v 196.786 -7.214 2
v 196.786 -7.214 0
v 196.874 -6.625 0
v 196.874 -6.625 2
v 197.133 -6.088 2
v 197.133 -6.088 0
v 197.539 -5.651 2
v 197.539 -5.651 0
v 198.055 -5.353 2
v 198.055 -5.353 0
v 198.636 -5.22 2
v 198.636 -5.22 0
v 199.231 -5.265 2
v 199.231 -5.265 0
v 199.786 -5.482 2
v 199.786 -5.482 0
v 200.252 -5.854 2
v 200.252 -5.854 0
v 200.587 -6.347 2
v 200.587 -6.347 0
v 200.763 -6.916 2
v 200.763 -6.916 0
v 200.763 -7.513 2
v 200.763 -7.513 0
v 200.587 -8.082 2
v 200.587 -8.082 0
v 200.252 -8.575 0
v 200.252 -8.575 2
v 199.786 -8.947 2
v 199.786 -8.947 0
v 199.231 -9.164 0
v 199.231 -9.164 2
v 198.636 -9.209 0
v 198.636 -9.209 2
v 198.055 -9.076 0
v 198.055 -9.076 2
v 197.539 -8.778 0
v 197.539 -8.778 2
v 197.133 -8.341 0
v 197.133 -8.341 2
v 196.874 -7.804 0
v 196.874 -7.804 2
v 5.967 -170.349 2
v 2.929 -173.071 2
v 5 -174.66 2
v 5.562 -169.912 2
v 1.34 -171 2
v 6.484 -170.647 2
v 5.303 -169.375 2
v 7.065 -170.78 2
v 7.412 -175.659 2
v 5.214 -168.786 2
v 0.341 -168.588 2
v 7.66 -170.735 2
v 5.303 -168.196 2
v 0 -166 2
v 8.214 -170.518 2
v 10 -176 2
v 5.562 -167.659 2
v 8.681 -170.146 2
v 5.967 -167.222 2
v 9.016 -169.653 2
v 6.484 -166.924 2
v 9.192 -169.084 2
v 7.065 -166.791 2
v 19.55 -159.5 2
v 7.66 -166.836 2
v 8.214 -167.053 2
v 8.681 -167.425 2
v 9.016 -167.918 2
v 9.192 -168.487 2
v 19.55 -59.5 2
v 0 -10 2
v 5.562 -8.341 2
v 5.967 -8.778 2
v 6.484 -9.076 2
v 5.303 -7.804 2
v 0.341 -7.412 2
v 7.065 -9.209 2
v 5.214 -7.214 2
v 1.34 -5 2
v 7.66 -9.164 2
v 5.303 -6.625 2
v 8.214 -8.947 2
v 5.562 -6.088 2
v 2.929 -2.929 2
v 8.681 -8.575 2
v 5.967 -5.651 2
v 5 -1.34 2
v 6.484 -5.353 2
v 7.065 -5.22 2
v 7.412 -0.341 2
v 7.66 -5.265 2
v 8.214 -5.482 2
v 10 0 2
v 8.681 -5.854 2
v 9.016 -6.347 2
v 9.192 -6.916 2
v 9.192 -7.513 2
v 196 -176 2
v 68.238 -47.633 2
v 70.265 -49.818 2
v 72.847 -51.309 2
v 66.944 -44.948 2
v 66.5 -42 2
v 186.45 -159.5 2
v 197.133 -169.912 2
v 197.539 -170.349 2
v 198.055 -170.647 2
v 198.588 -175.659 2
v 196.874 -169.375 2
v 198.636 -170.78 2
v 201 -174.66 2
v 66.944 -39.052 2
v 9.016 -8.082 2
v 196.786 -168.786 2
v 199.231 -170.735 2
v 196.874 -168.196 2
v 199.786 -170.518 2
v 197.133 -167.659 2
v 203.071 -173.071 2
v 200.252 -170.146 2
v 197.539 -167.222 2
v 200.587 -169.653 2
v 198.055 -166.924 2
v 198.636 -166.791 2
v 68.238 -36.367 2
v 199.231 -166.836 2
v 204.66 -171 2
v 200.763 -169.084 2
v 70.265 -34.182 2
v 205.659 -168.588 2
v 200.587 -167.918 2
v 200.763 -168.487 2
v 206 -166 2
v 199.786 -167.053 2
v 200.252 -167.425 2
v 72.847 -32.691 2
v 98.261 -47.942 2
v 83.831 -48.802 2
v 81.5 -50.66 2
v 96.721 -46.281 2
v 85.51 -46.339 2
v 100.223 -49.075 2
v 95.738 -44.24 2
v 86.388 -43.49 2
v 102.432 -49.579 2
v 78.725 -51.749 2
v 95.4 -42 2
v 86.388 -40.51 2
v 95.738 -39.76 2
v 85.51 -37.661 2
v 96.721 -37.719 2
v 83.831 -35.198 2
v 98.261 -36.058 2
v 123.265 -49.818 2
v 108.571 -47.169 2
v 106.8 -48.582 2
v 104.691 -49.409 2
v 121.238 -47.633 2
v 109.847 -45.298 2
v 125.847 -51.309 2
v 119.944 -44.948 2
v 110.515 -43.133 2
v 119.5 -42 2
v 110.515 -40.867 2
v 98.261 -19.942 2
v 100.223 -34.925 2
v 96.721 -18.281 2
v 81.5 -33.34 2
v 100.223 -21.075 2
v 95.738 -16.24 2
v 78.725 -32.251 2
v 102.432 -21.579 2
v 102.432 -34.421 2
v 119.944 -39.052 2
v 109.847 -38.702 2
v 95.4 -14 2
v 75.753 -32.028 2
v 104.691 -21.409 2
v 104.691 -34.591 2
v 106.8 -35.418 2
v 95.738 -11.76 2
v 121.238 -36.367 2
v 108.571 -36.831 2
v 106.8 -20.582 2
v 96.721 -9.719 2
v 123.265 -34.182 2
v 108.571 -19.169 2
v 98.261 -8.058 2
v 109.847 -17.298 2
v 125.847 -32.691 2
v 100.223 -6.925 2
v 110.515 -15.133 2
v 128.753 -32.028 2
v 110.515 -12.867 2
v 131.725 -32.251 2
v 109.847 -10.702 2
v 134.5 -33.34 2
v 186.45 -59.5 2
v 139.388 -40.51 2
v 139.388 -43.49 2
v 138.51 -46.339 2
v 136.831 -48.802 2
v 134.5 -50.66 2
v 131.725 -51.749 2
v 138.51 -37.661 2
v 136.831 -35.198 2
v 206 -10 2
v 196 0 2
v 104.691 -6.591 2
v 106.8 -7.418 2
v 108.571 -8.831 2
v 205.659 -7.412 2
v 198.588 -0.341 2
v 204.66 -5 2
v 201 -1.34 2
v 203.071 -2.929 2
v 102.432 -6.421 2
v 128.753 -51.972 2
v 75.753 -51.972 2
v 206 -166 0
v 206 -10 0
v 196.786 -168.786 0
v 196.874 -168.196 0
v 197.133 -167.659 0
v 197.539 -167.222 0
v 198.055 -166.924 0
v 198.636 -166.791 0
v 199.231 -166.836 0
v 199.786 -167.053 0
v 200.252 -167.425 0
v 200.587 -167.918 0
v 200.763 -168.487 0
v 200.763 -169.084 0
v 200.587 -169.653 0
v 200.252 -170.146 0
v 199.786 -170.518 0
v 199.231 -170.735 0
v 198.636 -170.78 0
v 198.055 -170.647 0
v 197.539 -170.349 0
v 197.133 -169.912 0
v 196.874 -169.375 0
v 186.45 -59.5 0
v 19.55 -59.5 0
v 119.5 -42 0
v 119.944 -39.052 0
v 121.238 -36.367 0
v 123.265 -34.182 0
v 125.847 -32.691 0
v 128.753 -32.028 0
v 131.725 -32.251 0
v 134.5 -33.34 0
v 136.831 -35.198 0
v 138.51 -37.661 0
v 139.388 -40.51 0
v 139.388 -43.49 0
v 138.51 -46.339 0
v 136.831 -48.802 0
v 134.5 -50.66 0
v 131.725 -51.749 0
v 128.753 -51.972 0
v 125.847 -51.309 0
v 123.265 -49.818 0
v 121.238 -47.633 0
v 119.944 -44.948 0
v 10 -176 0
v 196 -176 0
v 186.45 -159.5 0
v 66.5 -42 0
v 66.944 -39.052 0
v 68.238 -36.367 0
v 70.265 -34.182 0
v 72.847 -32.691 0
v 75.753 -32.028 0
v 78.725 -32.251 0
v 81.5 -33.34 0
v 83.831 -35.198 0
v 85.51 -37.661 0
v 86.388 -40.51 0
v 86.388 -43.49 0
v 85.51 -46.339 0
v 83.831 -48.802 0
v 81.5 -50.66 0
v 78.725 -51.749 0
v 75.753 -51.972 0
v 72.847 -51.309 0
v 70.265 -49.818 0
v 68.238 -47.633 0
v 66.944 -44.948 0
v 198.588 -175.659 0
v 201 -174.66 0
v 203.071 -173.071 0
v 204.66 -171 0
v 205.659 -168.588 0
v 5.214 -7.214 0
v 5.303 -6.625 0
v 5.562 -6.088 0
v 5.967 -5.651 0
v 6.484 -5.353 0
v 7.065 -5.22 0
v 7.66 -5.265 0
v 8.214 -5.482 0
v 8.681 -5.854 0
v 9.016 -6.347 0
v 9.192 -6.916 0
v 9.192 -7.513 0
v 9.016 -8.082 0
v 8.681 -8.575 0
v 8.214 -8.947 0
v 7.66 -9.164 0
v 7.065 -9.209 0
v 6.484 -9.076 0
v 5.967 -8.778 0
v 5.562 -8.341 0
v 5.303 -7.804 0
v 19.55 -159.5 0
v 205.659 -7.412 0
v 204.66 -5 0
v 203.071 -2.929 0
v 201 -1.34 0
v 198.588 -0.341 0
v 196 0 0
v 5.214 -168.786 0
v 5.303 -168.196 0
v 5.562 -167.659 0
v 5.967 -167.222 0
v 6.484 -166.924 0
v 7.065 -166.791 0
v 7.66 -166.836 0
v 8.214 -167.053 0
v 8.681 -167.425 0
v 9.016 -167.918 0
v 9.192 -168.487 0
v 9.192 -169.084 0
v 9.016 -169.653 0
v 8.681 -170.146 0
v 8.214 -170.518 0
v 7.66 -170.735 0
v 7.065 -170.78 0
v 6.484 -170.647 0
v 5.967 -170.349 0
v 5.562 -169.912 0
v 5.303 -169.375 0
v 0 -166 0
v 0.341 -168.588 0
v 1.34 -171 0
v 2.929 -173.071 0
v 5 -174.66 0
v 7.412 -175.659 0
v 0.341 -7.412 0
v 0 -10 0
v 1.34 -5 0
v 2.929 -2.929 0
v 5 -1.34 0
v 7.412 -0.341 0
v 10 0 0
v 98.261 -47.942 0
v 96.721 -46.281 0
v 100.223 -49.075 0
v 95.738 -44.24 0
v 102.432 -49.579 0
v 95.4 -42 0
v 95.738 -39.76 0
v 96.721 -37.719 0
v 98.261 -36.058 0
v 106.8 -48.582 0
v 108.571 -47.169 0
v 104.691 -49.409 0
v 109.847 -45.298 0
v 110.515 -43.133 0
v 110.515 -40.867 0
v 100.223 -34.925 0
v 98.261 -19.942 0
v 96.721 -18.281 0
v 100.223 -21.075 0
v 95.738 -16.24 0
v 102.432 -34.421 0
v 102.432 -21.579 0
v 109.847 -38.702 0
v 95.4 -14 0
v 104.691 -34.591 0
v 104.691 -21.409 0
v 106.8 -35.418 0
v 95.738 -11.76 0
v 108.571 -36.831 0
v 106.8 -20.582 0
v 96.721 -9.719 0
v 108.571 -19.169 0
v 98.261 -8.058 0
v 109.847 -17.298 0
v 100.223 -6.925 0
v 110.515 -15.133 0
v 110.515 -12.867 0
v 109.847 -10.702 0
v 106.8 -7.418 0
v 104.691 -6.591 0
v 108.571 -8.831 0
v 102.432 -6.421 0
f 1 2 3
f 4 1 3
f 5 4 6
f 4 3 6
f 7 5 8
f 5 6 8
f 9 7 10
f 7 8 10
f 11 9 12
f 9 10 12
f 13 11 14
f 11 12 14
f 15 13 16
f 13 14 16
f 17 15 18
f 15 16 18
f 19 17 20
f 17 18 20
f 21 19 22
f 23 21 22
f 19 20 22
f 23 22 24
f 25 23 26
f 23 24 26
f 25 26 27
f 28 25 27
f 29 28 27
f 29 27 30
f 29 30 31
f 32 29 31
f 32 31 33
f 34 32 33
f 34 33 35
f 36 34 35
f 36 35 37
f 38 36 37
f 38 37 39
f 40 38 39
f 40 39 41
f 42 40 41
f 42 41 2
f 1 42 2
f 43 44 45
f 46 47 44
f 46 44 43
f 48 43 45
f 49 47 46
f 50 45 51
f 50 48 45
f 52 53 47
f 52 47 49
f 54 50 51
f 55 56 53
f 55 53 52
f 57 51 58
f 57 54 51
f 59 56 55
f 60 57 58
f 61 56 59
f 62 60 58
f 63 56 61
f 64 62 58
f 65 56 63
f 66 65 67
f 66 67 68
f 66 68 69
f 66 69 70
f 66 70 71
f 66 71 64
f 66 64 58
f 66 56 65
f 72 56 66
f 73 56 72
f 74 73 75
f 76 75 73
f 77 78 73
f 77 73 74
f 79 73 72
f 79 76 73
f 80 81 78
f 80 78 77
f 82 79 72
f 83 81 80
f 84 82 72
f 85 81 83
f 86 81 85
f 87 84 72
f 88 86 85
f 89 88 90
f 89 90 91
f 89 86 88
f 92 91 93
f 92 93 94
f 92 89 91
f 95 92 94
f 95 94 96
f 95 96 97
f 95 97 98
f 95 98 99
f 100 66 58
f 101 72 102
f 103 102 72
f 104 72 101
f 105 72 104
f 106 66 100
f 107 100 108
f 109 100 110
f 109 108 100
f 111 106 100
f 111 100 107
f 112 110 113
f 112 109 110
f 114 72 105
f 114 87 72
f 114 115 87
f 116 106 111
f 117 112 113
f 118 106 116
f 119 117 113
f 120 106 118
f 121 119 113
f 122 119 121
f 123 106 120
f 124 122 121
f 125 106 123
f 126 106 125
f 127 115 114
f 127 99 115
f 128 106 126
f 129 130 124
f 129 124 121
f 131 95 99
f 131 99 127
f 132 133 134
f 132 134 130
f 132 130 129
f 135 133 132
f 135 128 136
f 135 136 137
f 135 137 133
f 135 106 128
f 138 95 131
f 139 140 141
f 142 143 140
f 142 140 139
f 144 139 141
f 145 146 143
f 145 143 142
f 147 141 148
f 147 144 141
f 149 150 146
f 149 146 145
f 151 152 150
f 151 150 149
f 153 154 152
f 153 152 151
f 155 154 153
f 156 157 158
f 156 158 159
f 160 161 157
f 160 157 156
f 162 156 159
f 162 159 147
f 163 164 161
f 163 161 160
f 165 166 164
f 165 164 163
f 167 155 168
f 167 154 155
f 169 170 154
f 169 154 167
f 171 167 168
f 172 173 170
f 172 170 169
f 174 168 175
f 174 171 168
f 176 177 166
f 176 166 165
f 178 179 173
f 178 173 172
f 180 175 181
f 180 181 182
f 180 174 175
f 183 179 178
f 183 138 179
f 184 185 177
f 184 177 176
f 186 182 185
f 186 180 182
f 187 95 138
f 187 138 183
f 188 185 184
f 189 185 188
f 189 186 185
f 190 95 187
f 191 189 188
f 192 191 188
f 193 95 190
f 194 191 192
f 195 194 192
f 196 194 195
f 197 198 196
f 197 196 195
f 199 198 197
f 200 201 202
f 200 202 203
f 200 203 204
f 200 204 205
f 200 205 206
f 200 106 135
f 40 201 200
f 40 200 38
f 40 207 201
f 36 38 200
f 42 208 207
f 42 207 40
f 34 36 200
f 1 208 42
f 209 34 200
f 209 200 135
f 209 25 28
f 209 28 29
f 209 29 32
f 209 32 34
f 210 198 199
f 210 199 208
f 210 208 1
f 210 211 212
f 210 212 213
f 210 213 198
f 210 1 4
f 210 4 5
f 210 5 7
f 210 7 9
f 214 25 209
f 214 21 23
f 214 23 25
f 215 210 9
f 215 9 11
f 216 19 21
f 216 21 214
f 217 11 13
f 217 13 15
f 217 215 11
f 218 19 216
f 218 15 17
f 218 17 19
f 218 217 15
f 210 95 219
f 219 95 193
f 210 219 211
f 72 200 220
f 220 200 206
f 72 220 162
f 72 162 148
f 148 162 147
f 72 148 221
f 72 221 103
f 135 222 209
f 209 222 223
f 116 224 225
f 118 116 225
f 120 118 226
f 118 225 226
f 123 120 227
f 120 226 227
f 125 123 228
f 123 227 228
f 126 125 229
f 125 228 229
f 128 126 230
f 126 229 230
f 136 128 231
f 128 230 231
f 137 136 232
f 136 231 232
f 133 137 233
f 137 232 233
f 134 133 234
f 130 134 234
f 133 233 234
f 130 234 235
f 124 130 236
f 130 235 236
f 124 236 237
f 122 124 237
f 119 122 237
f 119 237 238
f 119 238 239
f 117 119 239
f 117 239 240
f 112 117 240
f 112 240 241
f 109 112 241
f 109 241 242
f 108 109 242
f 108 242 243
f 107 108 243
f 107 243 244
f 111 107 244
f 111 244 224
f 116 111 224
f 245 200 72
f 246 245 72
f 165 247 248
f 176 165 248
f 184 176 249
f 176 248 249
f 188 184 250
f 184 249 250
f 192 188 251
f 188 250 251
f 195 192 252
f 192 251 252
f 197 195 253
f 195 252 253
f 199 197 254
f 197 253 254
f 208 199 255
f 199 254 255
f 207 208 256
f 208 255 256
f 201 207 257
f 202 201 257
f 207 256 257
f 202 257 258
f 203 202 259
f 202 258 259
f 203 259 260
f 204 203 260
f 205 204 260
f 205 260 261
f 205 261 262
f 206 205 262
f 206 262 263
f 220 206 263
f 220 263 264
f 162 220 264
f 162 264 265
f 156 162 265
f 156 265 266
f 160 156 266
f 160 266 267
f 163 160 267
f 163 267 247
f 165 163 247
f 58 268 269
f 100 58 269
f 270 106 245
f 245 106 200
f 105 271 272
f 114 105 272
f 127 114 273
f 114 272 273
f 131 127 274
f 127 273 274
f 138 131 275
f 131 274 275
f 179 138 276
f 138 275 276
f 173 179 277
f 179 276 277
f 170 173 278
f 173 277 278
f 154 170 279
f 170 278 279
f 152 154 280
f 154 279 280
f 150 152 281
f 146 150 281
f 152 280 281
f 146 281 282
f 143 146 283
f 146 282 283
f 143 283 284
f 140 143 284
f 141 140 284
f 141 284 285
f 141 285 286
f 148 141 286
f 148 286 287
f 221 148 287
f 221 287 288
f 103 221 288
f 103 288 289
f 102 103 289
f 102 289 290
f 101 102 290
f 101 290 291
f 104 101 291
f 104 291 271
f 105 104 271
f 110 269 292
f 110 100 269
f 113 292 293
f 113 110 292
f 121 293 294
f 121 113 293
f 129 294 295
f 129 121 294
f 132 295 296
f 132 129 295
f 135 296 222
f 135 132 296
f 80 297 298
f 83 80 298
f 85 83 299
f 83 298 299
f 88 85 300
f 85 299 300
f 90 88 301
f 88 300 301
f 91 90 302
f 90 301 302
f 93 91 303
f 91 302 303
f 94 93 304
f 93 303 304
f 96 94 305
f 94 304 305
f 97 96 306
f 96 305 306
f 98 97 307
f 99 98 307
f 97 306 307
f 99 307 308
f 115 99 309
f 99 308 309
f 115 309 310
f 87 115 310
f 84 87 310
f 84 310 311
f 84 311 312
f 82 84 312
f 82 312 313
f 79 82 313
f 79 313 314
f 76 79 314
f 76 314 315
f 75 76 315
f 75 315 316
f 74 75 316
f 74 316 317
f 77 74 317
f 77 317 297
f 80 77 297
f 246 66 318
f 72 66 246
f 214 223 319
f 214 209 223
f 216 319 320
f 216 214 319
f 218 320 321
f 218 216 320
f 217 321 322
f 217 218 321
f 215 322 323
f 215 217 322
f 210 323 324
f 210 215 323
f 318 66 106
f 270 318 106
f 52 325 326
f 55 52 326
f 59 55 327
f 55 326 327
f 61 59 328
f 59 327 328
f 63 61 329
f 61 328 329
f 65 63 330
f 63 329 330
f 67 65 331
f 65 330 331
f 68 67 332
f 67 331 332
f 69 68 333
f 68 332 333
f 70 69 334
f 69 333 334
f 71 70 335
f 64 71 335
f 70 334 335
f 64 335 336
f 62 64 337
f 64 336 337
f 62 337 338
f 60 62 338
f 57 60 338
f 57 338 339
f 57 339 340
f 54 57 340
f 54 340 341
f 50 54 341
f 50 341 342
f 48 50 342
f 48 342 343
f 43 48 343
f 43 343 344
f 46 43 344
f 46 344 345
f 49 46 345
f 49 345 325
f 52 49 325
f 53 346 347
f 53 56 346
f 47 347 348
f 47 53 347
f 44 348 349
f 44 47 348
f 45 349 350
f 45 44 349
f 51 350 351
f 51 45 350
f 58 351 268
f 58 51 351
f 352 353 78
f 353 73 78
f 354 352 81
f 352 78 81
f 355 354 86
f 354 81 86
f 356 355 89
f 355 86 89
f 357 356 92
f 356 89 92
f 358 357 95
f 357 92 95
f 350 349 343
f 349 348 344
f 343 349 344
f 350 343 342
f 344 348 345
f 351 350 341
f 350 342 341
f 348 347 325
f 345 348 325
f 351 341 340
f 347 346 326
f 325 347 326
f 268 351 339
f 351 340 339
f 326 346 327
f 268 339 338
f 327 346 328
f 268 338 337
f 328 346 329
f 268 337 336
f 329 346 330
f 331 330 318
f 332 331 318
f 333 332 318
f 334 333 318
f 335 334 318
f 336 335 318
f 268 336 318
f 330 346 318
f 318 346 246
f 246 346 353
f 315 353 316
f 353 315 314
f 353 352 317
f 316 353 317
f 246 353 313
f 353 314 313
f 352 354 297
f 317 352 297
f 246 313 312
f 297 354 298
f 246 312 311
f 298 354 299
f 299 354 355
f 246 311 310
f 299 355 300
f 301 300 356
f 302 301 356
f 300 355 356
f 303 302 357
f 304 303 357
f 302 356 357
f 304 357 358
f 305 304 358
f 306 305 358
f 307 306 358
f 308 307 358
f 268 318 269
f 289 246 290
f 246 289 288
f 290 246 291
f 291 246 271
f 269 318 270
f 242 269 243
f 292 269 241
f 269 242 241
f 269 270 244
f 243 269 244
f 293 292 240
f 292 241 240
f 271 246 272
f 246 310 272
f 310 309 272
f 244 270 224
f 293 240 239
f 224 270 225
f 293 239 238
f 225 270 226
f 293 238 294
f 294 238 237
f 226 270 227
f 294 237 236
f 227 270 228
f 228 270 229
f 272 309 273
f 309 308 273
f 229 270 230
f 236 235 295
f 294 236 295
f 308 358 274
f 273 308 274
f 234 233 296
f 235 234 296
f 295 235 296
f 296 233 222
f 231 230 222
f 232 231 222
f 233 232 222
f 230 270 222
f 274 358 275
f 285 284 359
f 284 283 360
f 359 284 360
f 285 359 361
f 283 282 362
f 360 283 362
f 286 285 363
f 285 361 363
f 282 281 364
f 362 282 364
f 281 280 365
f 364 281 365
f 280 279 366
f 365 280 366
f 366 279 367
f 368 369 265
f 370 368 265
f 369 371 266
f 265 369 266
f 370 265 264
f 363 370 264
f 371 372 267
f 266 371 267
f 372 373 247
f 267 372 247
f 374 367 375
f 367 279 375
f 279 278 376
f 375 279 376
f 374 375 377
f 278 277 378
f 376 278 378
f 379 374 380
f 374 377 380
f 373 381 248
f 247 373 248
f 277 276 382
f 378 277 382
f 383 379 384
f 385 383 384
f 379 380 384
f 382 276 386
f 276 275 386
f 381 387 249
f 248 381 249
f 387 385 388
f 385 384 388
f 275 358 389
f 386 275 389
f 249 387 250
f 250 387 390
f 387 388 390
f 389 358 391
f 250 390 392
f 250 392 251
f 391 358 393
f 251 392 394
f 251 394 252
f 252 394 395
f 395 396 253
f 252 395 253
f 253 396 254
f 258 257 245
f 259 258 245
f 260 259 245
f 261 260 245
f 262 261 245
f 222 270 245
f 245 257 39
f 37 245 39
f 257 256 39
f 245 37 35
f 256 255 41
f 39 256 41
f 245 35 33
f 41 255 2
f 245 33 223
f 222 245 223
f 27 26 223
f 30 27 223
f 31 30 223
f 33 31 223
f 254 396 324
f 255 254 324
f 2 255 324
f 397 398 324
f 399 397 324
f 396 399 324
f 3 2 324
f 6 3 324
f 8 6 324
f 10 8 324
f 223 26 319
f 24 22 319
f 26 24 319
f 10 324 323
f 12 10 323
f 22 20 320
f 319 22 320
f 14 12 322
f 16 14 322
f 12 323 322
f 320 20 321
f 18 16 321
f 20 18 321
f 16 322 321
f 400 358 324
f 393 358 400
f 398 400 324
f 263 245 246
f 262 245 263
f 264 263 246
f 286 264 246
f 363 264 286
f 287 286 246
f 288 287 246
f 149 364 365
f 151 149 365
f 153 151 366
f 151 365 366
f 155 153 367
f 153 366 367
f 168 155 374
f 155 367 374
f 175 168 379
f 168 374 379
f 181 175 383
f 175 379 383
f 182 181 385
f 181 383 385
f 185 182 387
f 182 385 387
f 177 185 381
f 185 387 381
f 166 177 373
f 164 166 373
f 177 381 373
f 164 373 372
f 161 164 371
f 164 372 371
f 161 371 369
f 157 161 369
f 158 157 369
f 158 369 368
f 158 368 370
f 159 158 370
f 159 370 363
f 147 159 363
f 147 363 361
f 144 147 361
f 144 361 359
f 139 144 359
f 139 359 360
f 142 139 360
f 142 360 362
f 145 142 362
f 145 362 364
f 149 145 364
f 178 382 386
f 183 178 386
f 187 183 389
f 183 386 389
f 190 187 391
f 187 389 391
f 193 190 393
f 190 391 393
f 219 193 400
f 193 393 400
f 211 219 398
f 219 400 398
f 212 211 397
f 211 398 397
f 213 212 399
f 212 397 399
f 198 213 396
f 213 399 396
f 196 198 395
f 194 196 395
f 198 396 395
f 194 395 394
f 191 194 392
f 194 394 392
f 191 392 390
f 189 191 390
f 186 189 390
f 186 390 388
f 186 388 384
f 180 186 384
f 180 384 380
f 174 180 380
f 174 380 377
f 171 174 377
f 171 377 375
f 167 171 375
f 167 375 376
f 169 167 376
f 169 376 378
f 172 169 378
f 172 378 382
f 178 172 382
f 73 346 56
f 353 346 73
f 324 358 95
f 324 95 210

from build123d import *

# Parameters (mm, degrees)
SKETCH1_W           = 206
SKETCH1_H           = 176
BOSS_EXTRUDE1_DEPTH = 2
FILLET1_R           = 10
SKETCH2_R           = 2
CUT_EXTRUDE1_DEPTH  = 5
SKETCH3_R           = 7.6
SKETCH3_R_2         = 10
CUT_EXTRUDE2_DEPTH  = 5
SKETCH4_W           = 83.45
SKETCH4_H           = 100
CUT_EXTRUDE3_DEPTH  = 10


with BuildPart() as part:
    # Sketch1 → Boss-Extrude1 (new body)
    with BuildSketch(Plane.XY):
        with Locations((103, -88)):
            Rectangle(SKETCH1_W, SKETCH1_H)
    extrude(amount=BOSS_EXTRUDE1_DEPTH)

    # Fillet1
    fillet1_edges = [part.edges().sort_by_distance(p)[0] for p in [
        (0, 0, 1),
        (206, 0, 1),
        (206, -176, 1),
        (0, -176, 1),
    ]]
    fillet(fillet1_edges, radius=FILLET1_R)

    # Sketch2 → Cut-Extrude1 (cut)
    with BuildSketch(Plane(origin=(0, 0, 0), x_dir=(-1, 0, 0), z_dir=(0, 0, -1))):
        with Locations((-198.78553391, -7.21446609)):
            Circle(SKETCH2_R)
        with Locations((-7.21446609, -7.21446609)):
            Circle(SKETCH2_R)
        with Locations((-7.21446609, -168.78553391)):
            Circle(SKETCH2_R)
        with Locations((-198.78553391, -168.78553391)):
            Circle(SKETCH2_R)
    extrude(amount=-CUT_EXTRUDE1_DEPTH, mode=Mode.SUBTRACT)

    # Sketch3 → Cut-Extrude2 (cut)
    with BuildSketch(Plane(origin=(0, 0, 0), x_dir=(-1, 0, 0), z_dir=(0, 0, -1))):
        with Locations((-103, -14)):
            Circle(SKETCH3_R)
        with Locations((-129.5, -42)):
            Circle(SKETCH3_R_2)
        with Locations((-103, -42)):
            Circle(SKETCH3_R)
        with Locations((-76.5, -42)):
            Circle(SKETCH3_R_2)
    extrude(amount=-CUT_EXTRUDE2_DEPTH, mode=Mode.SUBTRACT)

    # Sketch4 → Cut-Extrude3 (cut)
    with BuildSketch(Plane.XY.offset(2)):
        with Locations((61.275, -109.5)):
            Rectangle(SKETCH4_W, SKETCH4_H)
        with Locations((144.725, -109.5)):
            Rectangle(SKETCH4_W, SKETCH4_H)
    extrude(amount=-CUT_EXTRUDE3_DEPTH, mode=Mode.SUBTRACT)


solid = part.part
